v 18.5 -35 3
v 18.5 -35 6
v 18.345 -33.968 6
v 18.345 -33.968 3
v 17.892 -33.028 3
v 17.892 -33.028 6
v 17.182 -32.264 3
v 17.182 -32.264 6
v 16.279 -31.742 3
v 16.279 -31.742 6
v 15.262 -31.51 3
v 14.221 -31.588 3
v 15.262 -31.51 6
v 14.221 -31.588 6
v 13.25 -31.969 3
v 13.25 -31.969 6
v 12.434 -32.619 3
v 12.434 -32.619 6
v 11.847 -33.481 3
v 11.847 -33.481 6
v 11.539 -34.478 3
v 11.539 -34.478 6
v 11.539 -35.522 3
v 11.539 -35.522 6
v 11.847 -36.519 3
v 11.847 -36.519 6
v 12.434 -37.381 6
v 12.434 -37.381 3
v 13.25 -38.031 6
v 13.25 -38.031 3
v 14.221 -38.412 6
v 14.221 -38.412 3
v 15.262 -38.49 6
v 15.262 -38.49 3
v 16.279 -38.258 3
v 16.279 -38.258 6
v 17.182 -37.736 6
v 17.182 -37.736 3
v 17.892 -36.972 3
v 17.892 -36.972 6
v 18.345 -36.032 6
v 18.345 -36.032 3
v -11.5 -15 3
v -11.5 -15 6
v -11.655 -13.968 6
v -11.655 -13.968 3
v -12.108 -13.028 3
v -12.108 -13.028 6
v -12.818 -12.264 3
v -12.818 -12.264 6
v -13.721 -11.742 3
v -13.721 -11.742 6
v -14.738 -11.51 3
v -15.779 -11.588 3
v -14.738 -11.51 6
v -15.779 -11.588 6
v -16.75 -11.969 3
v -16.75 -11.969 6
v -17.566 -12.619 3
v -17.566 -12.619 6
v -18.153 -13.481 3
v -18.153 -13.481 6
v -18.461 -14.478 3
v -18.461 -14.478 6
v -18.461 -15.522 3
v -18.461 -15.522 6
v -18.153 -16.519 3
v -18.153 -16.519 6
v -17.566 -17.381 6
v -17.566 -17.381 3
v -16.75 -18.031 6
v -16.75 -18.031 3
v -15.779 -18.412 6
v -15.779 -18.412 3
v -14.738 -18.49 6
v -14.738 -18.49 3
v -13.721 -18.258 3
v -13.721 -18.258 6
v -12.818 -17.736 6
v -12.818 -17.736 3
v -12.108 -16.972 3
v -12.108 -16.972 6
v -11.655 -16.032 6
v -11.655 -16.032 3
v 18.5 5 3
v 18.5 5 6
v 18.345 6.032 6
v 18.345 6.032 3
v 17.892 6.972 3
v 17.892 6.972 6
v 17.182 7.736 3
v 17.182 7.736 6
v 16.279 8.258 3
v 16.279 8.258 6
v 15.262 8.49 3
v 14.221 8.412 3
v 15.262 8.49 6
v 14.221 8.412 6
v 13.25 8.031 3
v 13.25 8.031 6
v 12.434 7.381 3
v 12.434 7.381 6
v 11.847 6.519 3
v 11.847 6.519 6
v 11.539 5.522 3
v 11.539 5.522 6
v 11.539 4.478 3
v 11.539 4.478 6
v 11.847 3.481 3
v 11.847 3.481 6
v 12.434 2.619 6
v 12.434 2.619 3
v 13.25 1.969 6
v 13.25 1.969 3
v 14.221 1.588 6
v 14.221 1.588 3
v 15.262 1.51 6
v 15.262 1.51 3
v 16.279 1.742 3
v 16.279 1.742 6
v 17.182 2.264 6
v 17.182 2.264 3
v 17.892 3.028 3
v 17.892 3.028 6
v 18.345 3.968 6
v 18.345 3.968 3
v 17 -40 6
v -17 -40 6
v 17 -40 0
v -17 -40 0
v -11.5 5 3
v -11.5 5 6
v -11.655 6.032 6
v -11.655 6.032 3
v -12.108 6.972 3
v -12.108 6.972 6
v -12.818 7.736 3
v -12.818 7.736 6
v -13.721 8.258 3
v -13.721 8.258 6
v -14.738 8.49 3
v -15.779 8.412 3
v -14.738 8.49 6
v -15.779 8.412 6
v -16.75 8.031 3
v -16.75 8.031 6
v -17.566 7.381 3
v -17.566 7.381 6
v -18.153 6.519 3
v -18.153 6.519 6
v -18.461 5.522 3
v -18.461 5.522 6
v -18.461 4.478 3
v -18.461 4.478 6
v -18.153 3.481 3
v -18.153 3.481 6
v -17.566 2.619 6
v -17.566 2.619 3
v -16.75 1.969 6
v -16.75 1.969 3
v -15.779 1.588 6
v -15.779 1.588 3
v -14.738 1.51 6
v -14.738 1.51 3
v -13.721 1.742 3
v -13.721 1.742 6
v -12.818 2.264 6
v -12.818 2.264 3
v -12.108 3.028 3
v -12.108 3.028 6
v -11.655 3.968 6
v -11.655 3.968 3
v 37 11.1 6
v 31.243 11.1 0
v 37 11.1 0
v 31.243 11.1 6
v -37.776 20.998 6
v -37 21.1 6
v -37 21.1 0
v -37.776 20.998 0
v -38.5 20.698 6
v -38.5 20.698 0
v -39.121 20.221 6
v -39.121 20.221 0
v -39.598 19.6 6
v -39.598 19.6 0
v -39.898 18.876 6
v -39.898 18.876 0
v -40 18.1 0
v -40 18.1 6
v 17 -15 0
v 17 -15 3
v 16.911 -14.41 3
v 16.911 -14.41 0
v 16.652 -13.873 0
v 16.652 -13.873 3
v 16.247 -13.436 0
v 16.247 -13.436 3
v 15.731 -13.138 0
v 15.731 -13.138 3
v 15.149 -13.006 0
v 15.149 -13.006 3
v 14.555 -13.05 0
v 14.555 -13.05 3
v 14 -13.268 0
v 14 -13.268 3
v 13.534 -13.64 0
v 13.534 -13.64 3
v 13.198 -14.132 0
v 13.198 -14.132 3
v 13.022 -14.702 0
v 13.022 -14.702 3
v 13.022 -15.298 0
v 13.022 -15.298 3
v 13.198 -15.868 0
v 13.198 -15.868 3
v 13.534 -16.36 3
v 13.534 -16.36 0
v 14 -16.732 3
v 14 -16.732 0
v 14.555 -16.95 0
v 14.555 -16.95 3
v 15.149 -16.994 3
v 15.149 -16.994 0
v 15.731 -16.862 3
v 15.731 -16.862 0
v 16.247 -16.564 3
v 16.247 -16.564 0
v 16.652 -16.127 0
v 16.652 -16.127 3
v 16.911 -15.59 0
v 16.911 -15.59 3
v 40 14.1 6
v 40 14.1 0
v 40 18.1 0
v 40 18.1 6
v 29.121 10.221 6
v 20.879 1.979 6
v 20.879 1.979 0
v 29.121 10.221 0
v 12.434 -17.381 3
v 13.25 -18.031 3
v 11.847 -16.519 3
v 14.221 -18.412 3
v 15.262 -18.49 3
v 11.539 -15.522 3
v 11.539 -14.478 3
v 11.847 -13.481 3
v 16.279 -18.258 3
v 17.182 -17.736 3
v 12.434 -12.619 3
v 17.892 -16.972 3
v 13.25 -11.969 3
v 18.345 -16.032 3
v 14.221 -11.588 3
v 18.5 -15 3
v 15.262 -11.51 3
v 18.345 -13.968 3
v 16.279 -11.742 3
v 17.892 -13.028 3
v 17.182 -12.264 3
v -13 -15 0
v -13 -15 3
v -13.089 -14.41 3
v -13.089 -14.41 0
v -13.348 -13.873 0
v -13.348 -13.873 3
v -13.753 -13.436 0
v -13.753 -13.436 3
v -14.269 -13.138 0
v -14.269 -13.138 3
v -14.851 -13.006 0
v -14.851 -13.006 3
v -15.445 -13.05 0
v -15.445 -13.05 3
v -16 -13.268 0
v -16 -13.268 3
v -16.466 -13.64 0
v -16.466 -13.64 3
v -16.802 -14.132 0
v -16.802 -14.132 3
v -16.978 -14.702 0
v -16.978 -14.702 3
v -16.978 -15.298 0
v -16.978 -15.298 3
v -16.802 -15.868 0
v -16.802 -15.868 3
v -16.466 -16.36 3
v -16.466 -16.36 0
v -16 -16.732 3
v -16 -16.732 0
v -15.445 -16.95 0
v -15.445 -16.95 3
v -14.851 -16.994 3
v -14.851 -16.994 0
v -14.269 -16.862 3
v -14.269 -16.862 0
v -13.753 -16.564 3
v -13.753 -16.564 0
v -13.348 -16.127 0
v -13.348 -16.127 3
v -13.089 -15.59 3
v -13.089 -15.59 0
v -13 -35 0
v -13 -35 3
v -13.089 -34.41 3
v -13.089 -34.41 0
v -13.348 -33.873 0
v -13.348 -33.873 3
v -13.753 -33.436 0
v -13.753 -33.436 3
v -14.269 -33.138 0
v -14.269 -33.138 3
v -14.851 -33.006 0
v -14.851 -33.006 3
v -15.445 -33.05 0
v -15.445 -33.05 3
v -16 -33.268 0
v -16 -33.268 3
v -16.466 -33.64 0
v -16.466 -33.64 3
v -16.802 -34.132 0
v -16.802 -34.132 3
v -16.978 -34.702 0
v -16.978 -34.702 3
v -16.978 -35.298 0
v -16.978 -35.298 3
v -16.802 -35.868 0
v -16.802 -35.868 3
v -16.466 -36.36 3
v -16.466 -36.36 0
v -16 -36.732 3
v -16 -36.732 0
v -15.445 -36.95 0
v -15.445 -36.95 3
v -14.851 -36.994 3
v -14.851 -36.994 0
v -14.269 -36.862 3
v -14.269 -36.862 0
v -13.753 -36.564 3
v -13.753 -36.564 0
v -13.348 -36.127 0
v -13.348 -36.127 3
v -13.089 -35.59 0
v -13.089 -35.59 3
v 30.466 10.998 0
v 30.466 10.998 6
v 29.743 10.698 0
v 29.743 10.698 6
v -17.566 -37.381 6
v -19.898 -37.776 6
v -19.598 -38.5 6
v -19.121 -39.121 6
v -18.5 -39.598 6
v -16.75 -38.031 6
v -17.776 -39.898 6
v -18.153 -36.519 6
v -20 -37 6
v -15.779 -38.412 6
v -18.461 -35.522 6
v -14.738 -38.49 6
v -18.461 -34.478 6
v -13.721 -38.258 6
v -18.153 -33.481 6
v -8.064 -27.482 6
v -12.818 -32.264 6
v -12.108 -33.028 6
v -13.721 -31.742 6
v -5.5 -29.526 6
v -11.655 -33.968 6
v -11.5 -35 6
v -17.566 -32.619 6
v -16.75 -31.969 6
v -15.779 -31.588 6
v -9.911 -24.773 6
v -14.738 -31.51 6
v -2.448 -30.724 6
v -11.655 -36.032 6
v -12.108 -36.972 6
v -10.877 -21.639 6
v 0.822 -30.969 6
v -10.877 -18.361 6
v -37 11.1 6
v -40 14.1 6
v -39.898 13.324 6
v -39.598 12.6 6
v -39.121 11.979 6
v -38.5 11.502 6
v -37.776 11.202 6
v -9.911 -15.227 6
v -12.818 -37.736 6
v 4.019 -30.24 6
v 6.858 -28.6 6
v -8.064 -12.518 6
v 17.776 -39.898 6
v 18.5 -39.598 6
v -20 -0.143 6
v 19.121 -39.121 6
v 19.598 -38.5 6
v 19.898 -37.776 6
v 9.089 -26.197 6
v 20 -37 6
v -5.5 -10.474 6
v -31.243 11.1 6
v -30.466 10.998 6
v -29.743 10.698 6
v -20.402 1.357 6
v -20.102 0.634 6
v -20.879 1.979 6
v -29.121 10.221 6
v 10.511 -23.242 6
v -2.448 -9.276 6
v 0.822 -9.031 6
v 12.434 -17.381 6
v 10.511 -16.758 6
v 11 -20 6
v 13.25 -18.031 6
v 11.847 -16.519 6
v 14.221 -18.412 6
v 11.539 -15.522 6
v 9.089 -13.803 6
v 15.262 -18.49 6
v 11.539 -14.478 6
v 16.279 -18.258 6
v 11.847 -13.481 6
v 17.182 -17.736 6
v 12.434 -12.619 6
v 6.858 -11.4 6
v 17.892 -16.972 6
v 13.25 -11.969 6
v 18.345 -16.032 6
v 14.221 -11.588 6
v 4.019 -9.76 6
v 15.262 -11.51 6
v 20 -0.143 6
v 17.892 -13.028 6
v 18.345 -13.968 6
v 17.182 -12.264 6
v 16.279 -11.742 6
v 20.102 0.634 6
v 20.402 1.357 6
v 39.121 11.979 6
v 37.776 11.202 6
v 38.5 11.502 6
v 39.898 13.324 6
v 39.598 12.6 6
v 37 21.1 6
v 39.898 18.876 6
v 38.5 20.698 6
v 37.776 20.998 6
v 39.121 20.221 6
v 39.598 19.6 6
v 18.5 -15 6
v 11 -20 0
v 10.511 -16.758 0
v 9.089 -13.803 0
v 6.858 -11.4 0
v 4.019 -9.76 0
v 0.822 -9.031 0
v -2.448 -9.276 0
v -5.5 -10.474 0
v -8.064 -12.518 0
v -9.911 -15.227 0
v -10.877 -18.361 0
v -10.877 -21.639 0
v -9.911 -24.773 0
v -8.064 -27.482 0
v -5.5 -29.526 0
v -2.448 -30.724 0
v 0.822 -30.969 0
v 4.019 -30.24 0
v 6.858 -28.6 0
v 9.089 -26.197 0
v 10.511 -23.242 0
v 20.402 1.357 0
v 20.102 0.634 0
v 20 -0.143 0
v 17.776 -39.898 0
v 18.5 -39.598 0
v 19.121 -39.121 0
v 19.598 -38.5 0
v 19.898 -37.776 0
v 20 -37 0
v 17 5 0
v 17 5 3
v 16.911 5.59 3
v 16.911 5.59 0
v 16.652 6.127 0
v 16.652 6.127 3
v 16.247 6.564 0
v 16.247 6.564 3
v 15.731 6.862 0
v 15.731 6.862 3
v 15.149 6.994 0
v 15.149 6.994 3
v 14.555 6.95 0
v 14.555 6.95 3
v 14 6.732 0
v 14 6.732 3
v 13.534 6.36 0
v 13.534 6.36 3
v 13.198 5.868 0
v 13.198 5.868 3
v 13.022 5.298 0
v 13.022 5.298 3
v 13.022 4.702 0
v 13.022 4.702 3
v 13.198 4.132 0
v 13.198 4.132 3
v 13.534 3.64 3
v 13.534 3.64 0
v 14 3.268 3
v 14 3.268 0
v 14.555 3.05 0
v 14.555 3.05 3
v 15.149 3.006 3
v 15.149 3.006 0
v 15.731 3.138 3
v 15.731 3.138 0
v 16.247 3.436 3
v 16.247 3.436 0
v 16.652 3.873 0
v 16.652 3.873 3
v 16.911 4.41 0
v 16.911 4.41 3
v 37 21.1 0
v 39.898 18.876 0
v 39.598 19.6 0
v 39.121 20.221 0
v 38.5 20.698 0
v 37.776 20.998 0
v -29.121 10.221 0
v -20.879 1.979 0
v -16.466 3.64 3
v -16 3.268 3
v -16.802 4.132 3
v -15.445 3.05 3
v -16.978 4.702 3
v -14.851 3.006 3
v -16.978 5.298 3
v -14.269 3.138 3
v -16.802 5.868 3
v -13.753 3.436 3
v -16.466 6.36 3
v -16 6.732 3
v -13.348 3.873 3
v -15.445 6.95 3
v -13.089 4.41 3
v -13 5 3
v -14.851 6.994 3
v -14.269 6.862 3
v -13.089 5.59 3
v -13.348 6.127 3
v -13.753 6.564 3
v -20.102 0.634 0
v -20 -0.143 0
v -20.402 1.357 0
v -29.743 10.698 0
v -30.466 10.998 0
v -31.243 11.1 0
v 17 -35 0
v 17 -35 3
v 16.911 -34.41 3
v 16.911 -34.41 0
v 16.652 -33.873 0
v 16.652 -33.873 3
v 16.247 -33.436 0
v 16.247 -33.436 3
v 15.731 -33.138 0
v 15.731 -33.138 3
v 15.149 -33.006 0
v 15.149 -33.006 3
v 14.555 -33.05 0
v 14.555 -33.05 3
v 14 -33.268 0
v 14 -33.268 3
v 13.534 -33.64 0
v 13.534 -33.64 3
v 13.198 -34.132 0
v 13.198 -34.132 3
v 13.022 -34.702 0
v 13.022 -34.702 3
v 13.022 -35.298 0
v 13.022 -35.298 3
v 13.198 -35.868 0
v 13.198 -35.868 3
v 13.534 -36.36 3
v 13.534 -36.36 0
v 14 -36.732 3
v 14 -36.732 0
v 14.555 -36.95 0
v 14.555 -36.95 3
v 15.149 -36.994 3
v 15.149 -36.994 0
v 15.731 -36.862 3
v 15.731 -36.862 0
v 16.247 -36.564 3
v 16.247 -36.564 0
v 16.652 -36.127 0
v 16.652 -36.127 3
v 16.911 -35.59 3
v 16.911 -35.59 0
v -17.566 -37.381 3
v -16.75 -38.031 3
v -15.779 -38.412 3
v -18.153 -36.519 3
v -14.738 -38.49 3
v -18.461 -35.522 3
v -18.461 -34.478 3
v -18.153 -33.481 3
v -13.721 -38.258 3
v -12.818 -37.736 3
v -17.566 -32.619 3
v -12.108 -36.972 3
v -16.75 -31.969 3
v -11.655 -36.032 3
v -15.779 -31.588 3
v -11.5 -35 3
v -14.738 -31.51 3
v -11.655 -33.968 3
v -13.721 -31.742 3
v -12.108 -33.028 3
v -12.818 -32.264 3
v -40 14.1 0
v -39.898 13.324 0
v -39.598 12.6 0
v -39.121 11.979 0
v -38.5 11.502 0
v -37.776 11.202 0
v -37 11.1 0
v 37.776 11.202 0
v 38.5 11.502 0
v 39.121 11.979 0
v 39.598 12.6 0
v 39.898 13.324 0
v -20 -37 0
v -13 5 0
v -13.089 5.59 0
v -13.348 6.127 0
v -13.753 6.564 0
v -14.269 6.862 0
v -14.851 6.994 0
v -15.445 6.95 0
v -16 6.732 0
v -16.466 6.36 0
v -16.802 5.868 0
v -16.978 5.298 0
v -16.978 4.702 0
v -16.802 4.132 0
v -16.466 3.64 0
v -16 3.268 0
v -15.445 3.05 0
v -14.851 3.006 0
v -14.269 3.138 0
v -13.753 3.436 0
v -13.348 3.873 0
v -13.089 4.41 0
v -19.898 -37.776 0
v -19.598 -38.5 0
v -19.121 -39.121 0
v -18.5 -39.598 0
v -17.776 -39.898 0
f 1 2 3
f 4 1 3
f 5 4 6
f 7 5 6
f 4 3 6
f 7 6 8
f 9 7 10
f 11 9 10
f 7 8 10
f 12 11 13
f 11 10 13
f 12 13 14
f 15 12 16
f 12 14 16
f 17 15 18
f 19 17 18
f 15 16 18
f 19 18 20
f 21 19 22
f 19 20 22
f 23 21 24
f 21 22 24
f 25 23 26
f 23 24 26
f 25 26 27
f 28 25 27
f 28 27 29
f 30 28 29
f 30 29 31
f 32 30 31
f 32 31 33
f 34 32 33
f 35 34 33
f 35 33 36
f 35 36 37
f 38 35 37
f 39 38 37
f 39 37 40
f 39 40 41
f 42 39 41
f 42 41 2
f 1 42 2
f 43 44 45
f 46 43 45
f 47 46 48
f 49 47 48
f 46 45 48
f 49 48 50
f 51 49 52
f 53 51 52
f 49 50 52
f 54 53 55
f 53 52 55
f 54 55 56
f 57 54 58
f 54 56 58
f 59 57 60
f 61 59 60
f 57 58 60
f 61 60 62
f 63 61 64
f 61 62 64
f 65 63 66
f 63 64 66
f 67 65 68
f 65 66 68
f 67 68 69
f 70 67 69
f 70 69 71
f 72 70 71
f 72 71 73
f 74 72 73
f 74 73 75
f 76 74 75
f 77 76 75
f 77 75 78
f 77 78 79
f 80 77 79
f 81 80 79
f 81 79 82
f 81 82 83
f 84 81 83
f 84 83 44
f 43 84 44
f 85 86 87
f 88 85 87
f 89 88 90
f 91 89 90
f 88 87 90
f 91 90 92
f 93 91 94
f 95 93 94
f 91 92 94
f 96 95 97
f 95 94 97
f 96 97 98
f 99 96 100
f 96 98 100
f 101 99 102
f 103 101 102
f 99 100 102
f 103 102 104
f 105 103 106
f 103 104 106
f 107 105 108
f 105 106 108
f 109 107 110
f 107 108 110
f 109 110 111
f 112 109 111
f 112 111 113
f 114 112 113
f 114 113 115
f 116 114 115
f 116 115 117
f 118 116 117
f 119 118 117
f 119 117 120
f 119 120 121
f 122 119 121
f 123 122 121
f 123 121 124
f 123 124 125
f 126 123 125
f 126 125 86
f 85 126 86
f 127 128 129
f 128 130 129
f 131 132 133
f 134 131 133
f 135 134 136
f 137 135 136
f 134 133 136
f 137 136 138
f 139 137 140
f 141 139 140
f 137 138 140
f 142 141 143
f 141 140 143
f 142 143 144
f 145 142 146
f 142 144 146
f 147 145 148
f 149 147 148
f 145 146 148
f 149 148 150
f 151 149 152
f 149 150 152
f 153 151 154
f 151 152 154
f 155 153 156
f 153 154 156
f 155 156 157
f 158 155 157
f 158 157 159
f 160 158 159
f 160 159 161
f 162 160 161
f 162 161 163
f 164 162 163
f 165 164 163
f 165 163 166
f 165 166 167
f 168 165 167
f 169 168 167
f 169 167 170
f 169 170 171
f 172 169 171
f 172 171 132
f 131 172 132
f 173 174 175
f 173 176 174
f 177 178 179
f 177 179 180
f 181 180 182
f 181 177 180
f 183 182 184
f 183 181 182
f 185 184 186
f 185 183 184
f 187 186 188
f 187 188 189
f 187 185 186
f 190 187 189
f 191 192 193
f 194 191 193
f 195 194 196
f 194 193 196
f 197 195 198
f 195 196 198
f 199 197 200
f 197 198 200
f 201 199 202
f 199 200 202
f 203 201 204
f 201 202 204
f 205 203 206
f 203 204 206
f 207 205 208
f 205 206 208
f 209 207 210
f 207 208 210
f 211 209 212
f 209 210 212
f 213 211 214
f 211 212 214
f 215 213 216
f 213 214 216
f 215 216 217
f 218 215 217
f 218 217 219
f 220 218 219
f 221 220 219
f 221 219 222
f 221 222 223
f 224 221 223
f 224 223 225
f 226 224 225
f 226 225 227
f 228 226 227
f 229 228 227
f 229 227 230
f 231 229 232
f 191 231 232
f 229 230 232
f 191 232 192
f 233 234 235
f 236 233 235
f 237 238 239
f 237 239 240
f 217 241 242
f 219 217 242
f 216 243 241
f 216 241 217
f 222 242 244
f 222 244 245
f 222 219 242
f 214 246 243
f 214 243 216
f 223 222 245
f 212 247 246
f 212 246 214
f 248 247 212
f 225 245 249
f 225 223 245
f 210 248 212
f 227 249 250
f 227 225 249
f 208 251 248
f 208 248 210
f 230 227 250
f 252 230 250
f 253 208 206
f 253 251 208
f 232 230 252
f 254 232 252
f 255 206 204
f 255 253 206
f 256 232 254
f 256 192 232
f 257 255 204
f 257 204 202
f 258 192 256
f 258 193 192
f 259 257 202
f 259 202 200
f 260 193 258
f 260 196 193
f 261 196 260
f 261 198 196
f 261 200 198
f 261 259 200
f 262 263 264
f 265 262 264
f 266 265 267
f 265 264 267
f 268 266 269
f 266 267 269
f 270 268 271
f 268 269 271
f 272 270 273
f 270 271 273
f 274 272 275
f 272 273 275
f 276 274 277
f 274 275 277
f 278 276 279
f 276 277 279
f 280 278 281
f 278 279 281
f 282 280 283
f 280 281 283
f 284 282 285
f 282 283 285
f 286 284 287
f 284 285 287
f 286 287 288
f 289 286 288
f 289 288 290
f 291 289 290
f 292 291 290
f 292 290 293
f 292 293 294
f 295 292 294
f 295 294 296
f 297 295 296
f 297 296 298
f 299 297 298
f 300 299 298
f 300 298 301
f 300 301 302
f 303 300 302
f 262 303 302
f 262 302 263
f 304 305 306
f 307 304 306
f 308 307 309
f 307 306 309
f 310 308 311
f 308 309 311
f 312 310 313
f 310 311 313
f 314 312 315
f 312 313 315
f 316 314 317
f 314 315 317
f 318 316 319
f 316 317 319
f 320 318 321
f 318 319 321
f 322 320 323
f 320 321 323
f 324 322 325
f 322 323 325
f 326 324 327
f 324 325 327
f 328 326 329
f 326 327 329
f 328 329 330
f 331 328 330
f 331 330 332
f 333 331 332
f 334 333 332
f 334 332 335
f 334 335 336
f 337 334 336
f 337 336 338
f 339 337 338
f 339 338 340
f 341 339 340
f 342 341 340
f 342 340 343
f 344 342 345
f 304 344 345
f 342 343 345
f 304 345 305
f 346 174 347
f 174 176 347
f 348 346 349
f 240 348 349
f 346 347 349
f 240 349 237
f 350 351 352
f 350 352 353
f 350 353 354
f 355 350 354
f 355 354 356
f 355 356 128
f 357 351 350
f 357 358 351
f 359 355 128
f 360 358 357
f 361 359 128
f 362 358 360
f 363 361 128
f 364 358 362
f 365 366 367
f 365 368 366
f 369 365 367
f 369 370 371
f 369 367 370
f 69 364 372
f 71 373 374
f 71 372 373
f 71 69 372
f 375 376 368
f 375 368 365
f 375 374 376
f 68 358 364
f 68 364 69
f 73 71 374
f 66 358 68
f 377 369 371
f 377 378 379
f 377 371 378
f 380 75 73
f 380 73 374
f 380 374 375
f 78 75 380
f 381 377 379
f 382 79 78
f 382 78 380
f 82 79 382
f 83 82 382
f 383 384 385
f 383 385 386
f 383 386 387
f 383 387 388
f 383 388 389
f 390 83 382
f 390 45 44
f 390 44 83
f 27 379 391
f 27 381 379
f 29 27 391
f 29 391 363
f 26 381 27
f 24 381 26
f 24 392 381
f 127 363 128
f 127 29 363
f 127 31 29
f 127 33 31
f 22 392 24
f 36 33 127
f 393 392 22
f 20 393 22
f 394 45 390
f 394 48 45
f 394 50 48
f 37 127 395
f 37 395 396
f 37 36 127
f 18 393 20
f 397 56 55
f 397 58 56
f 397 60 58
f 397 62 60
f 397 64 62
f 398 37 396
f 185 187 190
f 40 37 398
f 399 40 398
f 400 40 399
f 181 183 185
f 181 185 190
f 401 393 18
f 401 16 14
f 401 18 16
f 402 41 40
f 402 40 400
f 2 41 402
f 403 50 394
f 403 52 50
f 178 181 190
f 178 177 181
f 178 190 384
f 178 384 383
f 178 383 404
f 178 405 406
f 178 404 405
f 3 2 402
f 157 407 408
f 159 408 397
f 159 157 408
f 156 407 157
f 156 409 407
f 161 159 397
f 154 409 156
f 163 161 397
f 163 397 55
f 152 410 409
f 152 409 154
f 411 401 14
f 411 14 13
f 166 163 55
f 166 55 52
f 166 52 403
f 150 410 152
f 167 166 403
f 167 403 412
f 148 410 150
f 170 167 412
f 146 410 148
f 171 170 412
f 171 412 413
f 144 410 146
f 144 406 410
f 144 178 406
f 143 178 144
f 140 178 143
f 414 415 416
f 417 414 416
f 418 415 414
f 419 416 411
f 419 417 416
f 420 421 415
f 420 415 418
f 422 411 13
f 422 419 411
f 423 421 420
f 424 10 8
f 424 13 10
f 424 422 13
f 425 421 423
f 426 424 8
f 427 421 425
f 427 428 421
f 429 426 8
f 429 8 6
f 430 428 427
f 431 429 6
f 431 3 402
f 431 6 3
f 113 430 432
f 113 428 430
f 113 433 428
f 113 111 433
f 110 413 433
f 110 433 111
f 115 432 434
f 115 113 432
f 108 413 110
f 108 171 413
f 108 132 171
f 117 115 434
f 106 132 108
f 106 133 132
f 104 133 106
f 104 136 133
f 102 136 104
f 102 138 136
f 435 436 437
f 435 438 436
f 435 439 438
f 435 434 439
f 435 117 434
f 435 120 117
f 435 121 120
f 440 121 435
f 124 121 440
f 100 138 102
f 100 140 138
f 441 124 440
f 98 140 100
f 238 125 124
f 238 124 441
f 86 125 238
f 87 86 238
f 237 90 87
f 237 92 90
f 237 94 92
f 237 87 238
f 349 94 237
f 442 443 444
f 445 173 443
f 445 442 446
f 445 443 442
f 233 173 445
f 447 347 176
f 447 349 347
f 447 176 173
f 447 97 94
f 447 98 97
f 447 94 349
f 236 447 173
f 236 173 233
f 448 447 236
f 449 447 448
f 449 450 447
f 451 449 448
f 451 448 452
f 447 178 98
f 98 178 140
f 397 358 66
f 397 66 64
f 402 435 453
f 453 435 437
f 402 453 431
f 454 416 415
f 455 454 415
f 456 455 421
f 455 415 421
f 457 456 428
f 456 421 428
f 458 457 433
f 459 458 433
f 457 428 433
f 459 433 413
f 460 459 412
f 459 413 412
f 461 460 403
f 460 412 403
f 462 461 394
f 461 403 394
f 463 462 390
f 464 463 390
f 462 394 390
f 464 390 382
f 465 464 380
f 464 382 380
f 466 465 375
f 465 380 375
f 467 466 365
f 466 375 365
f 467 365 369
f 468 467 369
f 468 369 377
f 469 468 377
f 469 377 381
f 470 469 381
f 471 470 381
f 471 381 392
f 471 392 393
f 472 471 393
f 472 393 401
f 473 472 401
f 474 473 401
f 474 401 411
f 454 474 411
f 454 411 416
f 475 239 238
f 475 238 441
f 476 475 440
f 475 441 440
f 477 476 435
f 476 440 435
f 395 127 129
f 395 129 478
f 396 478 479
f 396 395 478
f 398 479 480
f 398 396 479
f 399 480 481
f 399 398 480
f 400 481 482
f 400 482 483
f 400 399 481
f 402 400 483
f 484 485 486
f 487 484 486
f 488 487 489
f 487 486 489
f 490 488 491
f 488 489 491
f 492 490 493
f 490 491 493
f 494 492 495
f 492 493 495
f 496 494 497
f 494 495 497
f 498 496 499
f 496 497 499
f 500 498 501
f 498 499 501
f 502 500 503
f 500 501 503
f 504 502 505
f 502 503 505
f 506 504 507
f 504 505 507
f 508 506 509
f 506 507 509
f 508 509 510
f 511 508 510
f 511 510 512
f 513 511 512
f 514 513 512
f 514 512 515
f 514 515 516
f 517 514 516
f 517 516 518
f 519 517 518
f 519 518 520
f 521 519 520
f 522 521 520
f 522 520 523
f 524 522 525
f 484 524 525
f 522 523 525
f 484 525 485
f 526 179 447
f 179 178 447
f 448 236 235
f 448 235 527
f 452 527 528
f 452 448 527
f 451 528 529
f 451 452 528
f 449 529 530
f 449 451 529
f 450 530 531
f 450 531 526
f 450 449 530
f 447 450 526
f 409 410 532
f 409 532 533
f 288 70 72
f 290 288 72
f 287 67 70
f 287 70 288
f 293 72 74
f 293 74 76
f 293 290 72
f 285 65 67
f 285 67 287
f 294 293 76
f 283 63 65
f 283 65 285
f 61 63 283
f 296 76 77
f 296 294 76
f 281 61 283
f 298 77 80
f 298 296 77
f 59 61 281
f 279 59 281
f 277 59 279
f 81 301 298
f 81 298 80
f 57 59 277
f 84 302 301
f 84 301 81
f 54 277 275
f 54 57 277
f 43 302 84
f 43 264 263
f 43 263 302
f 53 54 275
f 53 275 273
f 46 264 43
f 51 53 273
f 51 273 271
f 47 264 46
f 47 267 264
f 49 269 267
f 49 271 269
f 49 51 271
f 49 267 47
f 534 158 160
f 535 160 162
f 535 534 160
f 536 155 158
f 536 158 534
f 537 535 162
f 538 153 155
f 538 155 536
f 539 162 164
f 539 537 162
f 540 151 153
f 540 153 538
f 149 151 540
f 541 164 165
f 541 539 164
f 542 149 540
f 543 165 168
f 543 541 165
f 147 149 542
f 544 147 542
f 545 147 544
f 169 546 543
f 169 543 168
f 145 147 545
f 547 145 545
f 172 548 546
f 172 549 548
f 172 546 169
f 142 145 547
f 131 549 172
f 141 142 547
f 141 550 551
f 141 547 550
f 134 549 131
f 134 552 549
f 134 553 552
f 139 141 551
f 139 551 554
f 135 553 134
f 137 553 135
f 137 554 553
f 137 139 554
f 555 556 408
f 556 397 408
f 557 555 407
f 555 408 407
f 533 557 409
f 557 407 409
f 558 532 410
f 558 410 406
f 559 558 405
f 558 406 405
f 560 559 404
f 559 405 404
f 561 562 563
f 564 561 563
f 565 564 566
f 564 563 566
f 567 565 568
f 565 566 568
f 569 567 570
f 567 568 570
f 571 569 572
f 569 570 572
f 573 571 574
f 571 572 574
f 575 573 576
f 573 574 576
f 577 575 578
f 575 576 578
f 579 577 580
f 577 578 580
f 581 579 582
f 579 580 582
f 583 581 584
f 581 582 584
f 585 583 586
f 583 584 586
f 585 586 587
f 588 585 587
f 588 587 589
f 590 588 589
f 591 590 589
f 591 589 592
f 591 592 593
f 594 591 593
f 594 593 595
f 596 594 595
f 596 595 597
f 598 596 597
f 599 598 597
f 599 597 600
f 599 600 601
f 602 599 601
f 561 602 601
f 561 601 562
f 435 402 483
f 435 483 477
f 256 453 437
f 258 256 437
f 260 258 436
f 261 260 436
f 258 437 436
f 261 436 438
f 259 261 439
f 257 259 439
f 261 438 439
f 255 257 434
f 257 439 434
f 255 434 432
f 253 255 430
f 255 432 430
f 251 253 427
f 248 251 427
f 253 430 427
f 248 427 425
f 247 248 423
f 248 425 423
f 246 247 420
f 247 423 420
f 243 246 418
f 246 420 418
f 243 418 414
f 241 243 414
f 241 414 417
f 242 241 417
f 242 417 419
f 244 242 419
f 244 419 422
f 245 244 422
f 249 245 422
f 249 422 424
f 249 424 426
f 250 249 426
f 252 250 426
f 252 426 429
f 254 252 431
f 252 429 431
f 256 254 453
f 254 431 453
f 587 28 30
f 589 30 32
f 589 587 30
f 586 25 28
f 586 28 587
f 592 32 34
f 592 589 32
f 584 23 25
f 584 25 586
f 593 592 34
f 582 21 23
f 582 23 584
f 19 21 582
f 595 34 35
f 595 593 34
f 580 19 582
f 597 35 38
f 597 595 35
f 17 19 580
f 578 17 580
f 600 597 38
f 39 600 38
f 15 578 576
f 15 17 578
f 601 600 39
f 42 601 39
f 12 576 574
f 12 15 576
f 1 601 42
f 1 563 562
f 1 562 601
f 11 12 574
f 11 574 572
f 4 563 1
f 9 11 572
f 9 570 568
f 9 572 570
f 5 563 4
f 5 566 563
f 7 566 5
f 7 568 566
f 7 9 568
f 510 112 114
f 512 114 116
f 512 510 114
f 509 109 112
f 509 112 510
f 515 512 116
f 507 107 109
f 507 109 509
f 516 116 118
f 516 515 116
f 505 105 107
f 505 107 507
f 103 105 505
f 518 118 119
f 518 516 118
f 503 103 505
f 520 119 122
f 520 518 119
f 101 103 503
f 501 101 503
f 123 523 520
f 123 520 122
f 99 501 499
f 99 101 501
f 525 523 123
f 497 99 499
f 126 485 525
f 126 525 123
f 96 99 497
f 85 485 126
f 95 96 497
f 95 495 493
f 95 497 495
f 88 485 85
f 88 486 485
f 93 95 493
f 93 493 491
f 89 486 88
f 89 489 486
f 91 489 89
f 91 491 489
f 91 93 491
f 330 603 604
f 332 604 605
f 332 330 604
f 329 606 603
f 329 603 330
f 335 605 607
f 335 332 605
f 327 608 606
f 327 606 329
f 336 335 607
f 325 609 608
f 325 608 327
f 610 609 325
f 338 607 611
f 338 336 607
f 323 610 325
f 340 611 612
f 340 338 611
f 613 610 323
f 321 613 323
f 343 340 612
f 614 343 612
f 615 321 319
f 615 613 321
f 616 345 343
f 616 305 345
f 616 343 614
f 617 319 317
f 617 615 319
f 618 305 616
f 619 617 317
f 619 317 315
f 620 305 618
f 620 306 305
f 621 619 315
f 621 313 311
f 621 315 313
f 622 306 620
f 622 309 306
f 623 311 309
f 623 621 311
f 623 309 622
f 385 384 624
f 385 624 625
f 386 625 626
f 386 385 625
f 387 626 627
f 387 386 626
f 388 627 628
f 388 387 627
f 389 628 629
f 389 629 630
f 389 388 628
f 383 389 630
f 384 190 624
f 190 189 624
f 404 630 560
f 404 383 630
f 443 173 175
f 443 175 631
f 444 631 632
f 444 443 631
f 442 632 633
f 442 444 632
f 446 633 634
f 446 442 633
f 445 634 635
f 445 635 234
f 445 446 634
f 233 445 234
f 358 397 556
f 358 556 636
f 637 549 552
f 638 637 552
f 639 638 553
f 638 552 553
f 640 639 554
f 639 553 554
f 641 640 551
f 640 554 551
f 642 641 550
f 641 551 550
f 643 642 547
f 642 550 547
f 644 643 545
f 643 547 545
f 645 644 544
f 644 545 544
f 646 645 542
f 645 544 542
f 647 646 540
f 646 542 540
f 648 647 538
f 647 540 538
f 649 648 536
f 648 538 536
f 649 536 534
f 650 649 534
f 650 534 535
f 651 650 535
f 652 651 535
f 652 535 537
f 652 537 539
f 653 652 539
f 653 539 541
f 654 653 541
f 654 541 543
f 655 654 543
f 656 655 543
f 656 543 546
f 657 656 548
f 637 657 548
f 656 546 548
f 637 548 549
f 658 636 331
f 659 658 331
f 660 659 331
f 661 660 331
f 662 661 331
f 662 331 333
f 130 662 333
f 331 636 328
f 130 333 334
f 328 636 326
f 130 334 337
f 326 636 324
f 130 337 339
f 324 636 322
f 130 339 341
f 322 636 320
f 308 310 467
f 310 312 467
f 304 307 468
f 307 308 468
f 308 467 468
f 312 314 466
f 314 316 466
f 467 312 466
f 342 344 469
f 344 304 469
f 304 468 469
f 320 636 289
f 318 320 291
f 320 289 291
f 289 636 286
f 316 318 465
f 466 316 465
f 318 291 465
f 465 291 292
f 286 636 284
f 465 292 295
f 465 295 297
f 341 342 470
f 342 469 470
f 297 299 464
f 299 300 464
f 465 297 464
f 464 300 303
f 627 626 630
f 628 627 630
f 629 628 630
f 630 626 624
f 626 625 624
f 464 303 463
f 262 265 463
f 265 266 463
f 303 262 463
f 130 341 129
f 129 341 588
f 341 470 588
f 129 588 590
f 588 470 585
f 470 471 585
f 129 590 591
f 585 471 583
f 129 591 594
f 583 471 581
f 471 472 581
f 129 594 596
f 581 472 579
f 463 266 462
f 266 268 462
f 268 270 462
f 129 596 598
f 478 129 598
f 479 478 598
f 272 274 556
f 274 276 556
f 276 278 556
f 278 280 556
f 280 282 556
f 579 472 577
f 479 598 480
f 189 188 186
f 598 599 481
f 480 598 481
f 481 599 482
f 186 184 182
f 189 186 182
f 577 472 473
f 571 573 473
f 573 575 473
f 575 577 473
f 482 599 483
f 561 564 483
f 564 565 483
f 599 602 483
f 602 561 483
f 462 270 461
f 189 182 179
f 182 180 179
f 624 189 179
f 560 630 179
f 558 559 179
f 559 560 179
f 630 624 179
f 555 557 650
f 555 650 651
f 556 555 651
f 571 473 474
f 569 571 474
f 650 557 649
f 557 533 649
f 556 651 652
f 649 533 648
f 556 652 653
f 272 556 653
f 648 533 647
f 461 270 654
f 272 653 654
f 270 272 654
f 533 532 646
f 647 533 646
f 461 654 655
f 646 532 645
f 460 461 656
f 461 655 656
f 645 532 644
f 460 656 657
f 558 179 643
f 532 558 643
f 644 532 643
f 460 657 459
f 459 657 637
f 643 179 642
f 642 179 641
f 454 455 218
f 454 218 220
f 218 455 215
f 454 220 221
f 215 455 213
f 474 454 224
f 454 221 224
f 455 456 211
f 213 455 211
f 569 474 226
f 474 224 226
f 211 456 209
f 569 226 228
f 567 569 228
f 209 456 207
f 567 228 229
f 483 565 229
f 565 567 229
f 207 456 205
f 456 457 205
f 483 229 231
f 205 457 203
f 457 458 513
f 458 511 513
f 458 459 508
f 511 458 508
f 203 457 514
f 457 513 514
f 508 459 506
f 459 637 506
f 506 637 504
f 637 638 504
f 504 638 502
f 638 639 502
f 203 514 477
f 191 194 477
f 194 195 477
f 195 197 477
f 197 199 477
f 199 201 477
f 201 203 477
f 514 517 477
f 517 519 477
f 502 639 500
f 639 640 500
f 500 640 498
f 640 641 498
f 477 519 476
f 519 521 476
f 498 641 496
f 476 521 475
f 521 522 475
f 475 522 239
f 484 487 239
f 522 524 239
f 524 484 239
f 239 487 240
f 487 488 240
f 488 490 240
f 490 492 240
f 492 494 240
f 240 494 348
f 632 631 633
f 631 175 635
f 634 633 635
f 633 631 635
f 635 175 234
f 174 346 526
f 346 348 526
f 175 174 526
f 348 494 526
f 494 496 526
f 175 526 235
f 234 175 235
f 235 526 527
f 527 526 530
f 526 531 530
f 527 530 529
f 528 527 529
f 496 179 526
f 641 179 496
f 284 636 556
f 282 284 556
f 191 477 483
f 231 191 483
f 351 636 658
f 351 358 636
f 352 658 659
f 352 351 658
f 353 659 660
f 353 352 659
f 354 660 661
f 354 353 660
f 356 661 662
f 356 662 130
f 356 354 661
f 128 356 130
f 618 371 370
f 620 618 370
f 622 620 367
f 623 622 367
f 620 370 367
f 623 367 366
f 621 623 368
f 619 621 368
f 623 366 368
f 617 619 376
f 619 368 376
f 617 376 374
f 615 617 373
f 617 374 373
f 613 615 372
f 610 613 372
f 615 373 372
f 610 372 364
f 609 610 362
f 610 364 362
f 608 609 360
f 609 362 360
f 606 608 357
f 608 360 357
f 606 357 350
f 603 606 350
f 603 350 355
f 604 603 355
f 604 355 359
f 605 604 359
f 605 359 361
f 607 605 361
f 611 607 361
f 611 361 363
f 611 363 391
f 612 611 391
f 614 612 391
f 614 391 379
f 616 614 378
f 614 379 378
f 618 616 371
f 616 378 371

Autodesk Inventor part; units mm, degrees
ref_plane "YZ Plane" through (0, 0, 0) normal (1, 0, 0) x (0, 1, 0)
ref_plane "XZ Plane" through (0, 0, 0) normal (0, 1, 0) x (-1, 0, 0)
ref_plane "XY Plane" through (0, 0, 0) normal (0, 0, 1) x (1, 0, 0)
sketch "Sketch1" plane through (0, 0, 0) normal (0, 0, 1) x (1, 0, 0)
  line L0 (-40, -40) -> (40, -40)
  line L1 (40, -40) -> (40, 40)
  line L2 (40, 40) -> (-40, 40)
  line L3 (-40, 40) -> (-40, -40)
  line L4 (-40, -40) -> (40, 40) construction
  line L5 (40, -40) -> (-40, 40) construction
  point P0 (0, 0)
  dimension "d0" = 80
  dimension "d1" = 80
extrude "Extrusion1" add sketch "Sketch1" along normal blind 6
sketch "Sketch2" plane through (0, 0, 6) normal (0, 0, 1) x (1, 0, 0)
  arc A0 (-37, 21.1) -> (-40, 18.1) centre (-37, 18.1) ccw projected
  line L0 (-40, 14.1) -> (-40, 18.1) projected
  arc A1 (-40, 14.1) -> (-37, 11.1) centre (-37, 14.1) ccw projected
  line L1 (-37, 11.1) -> (-31.2426, 11.1) projected
  arc A2 (-29.1213, 10.2213) -> (-31.2426, 11.1) centre (-31.2426, 8.1) ccw projected
  line L2 (-29.1213, 10.2213) -> (-20.8787, 1.9787) projected
  arc A3 (-20, -0.1426) -> (-20.8787, 1.9787) centre (-23, -0.1426) ccw projected
  line L3 (-20, -0.1426) -> (-20, -37) projected
  arc A4 (-20, -37) -> (-17, -40) centre (-17, -37) ccw projected
  line L4 (-17, -40) -> (17, -40) projected
  arc A5 (17, -40) -> (20, -37) centre (17, -37) ccw projected
  line L5 (20, -37) -> (20, -0.1426) projected
  arc A6 (20.8787, 1.9787) -> (20, -0.1426) centre (23, -0.1426) ccw projected
  line L6 (20.8787, 1.9787) -> (29.1213, 10.2213) projected
  arc A7 (31.2426, 11.1) -> (29.1213, 10.2213) centre (31.2426, 8.1) ccw projected
  line L7 (31.2426, 11.1) -> (37, 11.1) projected
  arc A8 (37, 11.1) -> (40, 14.1) centre (37, 14.1) ccw projected
  line L8 (40, 14.1) -> (40, 18.1) projected
  arc A9 (40, 18.1) -> (37, 21.1) centre (37, 18.1) ccw projected
  line L9 (-37, 21.1) -> (37, 21.1) projected
  line L10 (10.1, -30) -> (10.1, 11.1) projected
  line L11 (10.1, -30) -> (-10.1, -30) projected
  line L12 (-10.1, -30) -> (-10.1, 11.1) projected
  line L13 (-10.1, 11.1) -> (10.1, 11.1) projected
  circle A10 centre (15, -35) radius 2 projected
  circle A11 centre (-15, -15) radius 2 projected
  circle A12 centre (-15, -35) radius 2 projected
  circle A13 centre (15, -15) radius 2 projected
  circle A14 centre (-15, 5) radius 2 projected
  circle A15 centre (15, 5) radius 2 projected
  line L14 (-40, -40) -> (40, -40)
  line L15 (40, -40) -> (40, 40)
  line L16 (40, 40) -> (-40, 40)
  line L17 (-40, 40) -> (-40, -40)
  line L18 (-40, -40) -> (40, 40) construction
  line L19 (40, -40) -> (-40, 40) construction
  line L20 (40, 40) -> (-40, 40) projected
  line L21 (40, -40) -> (40, 40) projected
  line L22 (-10.1, -30) -> (10.1, -30)
  line L23 (10.1, -30) -> (10.1, 11.1)
  line L24 (10.1, 11.1) -> (-10.1, 11.1)
  line L25 (-10.1, 11.1) -> (-10.1, -30)
  line L26 (-10.1, -30) -> (10.1, 11.1) construction
  line L27 (10.1, -30) -> (-10.1, 11.1) construction
  point P0 (0, 0)
  point P1 (40, 14.1)
  point P2 (0, -9.45)
sketch "Sketch3" plane through (0, 0, 6) normal (0, 0, 1) x (1, 0, 0)
  line L0 (37, 14.1) -> (37, 21.1) projected
  line L1 (23, 14.1) -> (37, 14.1) projected
  arc A0 (23, 14.1) -> (17, 8.1) centre (23, 8.1) ccw projected
  line L2 (17, -37) -> (17, 8.1) projected
  line L3 (-17, -37) -> (17, -37) projected
  line L4 (-17, 8.1) -> (-17, -37) projected
  arc A1 (-17, 8.1) -> (-23, 14.1) centre (-23, 8.1) ccw projected
  line L5 (-37, 14.1) -> (-23, 14.1) projected
  line L6 (-37, 21.1) -> (-37, 14.1) projected
  line L7 (37, 21.1) -> (-37, 21.1) projected
  circle A2 centre (0, -20) radius 7.5 projected
  circle A3 centre (-7.525, -27.5) radius 2 projected
  circle A4 centre (7.525, -27.5) radius 2 projected
  circle A5 centre (7.525, 7.6) radius 2 projected
  circle A6 centre (-7.525, 7.6) radius 2 projected
  circle A7 centre (7.525, -7.5) radius 2 projected
  circle A8 centre (-7.525, -7.5) radius 2 projected
  circle A9 centre (0, -20) radius 11
  point P0 (0, 0)
  dimension "d4" = 22
extrude "Extrusion2" cut sketch "Sketch2" against normal blind 7 contours A0 L17 L16 L15 A9 L9 | A1 L1 A2 L2 A3 L3 A4 L14 L17 | L15 L14 A5 L5 A6 L6 A7 L7 A8 | A10 | A11 | A12 | A13 | A14 | A15
extrude "Extrusion3" cut sketch "Sketch3" against normal blind 7 contours A2 | A3 A9 | A3 A9 A4 | A4 A9 picked at (-7.1985, -27.22) picked at (7.2207, -27.1967)
sketch "Sketch4" plane through (0, 0, 6) normal (0, 0, 1) x (1, 0, 0)
  circle A0 centre (-15, 5) radius 2 projected
  circle A1 centre (15, 5) radius 2 projected
  circle A2 centre (-15, -15) radius 2 projected
  circle A3 centre (15, -15) radius 2 projected
  circle A4 centre (-15, -35) radius 2 projected
  circle A5 centre (15, -35) radius 2 projected
  circle A6 centre (15, 5) radius 3.5
  circle A7 centre (15, -15) radius 3.5
  circle A8 centre (15, -35) radius 3.5
  circle A9 centre (-15, -35) radius 3.5
  circle A10 centre (-15, -15) radius 3.5
  circle A11 centre (-15, 5) radius 3.5
  point P0 (0, 0)
  dimension "d9" = 7
  dimension "d10" = 7
  dimension "d11" = 7
  dimension "d12" = 7
  dimension "d13" = 7
  dimension "d14" = 7
extrude "Extrusion4" cut sketch "Sketch4" against normal blind 3
properties part number "stopper_motor_bracket_cover"
